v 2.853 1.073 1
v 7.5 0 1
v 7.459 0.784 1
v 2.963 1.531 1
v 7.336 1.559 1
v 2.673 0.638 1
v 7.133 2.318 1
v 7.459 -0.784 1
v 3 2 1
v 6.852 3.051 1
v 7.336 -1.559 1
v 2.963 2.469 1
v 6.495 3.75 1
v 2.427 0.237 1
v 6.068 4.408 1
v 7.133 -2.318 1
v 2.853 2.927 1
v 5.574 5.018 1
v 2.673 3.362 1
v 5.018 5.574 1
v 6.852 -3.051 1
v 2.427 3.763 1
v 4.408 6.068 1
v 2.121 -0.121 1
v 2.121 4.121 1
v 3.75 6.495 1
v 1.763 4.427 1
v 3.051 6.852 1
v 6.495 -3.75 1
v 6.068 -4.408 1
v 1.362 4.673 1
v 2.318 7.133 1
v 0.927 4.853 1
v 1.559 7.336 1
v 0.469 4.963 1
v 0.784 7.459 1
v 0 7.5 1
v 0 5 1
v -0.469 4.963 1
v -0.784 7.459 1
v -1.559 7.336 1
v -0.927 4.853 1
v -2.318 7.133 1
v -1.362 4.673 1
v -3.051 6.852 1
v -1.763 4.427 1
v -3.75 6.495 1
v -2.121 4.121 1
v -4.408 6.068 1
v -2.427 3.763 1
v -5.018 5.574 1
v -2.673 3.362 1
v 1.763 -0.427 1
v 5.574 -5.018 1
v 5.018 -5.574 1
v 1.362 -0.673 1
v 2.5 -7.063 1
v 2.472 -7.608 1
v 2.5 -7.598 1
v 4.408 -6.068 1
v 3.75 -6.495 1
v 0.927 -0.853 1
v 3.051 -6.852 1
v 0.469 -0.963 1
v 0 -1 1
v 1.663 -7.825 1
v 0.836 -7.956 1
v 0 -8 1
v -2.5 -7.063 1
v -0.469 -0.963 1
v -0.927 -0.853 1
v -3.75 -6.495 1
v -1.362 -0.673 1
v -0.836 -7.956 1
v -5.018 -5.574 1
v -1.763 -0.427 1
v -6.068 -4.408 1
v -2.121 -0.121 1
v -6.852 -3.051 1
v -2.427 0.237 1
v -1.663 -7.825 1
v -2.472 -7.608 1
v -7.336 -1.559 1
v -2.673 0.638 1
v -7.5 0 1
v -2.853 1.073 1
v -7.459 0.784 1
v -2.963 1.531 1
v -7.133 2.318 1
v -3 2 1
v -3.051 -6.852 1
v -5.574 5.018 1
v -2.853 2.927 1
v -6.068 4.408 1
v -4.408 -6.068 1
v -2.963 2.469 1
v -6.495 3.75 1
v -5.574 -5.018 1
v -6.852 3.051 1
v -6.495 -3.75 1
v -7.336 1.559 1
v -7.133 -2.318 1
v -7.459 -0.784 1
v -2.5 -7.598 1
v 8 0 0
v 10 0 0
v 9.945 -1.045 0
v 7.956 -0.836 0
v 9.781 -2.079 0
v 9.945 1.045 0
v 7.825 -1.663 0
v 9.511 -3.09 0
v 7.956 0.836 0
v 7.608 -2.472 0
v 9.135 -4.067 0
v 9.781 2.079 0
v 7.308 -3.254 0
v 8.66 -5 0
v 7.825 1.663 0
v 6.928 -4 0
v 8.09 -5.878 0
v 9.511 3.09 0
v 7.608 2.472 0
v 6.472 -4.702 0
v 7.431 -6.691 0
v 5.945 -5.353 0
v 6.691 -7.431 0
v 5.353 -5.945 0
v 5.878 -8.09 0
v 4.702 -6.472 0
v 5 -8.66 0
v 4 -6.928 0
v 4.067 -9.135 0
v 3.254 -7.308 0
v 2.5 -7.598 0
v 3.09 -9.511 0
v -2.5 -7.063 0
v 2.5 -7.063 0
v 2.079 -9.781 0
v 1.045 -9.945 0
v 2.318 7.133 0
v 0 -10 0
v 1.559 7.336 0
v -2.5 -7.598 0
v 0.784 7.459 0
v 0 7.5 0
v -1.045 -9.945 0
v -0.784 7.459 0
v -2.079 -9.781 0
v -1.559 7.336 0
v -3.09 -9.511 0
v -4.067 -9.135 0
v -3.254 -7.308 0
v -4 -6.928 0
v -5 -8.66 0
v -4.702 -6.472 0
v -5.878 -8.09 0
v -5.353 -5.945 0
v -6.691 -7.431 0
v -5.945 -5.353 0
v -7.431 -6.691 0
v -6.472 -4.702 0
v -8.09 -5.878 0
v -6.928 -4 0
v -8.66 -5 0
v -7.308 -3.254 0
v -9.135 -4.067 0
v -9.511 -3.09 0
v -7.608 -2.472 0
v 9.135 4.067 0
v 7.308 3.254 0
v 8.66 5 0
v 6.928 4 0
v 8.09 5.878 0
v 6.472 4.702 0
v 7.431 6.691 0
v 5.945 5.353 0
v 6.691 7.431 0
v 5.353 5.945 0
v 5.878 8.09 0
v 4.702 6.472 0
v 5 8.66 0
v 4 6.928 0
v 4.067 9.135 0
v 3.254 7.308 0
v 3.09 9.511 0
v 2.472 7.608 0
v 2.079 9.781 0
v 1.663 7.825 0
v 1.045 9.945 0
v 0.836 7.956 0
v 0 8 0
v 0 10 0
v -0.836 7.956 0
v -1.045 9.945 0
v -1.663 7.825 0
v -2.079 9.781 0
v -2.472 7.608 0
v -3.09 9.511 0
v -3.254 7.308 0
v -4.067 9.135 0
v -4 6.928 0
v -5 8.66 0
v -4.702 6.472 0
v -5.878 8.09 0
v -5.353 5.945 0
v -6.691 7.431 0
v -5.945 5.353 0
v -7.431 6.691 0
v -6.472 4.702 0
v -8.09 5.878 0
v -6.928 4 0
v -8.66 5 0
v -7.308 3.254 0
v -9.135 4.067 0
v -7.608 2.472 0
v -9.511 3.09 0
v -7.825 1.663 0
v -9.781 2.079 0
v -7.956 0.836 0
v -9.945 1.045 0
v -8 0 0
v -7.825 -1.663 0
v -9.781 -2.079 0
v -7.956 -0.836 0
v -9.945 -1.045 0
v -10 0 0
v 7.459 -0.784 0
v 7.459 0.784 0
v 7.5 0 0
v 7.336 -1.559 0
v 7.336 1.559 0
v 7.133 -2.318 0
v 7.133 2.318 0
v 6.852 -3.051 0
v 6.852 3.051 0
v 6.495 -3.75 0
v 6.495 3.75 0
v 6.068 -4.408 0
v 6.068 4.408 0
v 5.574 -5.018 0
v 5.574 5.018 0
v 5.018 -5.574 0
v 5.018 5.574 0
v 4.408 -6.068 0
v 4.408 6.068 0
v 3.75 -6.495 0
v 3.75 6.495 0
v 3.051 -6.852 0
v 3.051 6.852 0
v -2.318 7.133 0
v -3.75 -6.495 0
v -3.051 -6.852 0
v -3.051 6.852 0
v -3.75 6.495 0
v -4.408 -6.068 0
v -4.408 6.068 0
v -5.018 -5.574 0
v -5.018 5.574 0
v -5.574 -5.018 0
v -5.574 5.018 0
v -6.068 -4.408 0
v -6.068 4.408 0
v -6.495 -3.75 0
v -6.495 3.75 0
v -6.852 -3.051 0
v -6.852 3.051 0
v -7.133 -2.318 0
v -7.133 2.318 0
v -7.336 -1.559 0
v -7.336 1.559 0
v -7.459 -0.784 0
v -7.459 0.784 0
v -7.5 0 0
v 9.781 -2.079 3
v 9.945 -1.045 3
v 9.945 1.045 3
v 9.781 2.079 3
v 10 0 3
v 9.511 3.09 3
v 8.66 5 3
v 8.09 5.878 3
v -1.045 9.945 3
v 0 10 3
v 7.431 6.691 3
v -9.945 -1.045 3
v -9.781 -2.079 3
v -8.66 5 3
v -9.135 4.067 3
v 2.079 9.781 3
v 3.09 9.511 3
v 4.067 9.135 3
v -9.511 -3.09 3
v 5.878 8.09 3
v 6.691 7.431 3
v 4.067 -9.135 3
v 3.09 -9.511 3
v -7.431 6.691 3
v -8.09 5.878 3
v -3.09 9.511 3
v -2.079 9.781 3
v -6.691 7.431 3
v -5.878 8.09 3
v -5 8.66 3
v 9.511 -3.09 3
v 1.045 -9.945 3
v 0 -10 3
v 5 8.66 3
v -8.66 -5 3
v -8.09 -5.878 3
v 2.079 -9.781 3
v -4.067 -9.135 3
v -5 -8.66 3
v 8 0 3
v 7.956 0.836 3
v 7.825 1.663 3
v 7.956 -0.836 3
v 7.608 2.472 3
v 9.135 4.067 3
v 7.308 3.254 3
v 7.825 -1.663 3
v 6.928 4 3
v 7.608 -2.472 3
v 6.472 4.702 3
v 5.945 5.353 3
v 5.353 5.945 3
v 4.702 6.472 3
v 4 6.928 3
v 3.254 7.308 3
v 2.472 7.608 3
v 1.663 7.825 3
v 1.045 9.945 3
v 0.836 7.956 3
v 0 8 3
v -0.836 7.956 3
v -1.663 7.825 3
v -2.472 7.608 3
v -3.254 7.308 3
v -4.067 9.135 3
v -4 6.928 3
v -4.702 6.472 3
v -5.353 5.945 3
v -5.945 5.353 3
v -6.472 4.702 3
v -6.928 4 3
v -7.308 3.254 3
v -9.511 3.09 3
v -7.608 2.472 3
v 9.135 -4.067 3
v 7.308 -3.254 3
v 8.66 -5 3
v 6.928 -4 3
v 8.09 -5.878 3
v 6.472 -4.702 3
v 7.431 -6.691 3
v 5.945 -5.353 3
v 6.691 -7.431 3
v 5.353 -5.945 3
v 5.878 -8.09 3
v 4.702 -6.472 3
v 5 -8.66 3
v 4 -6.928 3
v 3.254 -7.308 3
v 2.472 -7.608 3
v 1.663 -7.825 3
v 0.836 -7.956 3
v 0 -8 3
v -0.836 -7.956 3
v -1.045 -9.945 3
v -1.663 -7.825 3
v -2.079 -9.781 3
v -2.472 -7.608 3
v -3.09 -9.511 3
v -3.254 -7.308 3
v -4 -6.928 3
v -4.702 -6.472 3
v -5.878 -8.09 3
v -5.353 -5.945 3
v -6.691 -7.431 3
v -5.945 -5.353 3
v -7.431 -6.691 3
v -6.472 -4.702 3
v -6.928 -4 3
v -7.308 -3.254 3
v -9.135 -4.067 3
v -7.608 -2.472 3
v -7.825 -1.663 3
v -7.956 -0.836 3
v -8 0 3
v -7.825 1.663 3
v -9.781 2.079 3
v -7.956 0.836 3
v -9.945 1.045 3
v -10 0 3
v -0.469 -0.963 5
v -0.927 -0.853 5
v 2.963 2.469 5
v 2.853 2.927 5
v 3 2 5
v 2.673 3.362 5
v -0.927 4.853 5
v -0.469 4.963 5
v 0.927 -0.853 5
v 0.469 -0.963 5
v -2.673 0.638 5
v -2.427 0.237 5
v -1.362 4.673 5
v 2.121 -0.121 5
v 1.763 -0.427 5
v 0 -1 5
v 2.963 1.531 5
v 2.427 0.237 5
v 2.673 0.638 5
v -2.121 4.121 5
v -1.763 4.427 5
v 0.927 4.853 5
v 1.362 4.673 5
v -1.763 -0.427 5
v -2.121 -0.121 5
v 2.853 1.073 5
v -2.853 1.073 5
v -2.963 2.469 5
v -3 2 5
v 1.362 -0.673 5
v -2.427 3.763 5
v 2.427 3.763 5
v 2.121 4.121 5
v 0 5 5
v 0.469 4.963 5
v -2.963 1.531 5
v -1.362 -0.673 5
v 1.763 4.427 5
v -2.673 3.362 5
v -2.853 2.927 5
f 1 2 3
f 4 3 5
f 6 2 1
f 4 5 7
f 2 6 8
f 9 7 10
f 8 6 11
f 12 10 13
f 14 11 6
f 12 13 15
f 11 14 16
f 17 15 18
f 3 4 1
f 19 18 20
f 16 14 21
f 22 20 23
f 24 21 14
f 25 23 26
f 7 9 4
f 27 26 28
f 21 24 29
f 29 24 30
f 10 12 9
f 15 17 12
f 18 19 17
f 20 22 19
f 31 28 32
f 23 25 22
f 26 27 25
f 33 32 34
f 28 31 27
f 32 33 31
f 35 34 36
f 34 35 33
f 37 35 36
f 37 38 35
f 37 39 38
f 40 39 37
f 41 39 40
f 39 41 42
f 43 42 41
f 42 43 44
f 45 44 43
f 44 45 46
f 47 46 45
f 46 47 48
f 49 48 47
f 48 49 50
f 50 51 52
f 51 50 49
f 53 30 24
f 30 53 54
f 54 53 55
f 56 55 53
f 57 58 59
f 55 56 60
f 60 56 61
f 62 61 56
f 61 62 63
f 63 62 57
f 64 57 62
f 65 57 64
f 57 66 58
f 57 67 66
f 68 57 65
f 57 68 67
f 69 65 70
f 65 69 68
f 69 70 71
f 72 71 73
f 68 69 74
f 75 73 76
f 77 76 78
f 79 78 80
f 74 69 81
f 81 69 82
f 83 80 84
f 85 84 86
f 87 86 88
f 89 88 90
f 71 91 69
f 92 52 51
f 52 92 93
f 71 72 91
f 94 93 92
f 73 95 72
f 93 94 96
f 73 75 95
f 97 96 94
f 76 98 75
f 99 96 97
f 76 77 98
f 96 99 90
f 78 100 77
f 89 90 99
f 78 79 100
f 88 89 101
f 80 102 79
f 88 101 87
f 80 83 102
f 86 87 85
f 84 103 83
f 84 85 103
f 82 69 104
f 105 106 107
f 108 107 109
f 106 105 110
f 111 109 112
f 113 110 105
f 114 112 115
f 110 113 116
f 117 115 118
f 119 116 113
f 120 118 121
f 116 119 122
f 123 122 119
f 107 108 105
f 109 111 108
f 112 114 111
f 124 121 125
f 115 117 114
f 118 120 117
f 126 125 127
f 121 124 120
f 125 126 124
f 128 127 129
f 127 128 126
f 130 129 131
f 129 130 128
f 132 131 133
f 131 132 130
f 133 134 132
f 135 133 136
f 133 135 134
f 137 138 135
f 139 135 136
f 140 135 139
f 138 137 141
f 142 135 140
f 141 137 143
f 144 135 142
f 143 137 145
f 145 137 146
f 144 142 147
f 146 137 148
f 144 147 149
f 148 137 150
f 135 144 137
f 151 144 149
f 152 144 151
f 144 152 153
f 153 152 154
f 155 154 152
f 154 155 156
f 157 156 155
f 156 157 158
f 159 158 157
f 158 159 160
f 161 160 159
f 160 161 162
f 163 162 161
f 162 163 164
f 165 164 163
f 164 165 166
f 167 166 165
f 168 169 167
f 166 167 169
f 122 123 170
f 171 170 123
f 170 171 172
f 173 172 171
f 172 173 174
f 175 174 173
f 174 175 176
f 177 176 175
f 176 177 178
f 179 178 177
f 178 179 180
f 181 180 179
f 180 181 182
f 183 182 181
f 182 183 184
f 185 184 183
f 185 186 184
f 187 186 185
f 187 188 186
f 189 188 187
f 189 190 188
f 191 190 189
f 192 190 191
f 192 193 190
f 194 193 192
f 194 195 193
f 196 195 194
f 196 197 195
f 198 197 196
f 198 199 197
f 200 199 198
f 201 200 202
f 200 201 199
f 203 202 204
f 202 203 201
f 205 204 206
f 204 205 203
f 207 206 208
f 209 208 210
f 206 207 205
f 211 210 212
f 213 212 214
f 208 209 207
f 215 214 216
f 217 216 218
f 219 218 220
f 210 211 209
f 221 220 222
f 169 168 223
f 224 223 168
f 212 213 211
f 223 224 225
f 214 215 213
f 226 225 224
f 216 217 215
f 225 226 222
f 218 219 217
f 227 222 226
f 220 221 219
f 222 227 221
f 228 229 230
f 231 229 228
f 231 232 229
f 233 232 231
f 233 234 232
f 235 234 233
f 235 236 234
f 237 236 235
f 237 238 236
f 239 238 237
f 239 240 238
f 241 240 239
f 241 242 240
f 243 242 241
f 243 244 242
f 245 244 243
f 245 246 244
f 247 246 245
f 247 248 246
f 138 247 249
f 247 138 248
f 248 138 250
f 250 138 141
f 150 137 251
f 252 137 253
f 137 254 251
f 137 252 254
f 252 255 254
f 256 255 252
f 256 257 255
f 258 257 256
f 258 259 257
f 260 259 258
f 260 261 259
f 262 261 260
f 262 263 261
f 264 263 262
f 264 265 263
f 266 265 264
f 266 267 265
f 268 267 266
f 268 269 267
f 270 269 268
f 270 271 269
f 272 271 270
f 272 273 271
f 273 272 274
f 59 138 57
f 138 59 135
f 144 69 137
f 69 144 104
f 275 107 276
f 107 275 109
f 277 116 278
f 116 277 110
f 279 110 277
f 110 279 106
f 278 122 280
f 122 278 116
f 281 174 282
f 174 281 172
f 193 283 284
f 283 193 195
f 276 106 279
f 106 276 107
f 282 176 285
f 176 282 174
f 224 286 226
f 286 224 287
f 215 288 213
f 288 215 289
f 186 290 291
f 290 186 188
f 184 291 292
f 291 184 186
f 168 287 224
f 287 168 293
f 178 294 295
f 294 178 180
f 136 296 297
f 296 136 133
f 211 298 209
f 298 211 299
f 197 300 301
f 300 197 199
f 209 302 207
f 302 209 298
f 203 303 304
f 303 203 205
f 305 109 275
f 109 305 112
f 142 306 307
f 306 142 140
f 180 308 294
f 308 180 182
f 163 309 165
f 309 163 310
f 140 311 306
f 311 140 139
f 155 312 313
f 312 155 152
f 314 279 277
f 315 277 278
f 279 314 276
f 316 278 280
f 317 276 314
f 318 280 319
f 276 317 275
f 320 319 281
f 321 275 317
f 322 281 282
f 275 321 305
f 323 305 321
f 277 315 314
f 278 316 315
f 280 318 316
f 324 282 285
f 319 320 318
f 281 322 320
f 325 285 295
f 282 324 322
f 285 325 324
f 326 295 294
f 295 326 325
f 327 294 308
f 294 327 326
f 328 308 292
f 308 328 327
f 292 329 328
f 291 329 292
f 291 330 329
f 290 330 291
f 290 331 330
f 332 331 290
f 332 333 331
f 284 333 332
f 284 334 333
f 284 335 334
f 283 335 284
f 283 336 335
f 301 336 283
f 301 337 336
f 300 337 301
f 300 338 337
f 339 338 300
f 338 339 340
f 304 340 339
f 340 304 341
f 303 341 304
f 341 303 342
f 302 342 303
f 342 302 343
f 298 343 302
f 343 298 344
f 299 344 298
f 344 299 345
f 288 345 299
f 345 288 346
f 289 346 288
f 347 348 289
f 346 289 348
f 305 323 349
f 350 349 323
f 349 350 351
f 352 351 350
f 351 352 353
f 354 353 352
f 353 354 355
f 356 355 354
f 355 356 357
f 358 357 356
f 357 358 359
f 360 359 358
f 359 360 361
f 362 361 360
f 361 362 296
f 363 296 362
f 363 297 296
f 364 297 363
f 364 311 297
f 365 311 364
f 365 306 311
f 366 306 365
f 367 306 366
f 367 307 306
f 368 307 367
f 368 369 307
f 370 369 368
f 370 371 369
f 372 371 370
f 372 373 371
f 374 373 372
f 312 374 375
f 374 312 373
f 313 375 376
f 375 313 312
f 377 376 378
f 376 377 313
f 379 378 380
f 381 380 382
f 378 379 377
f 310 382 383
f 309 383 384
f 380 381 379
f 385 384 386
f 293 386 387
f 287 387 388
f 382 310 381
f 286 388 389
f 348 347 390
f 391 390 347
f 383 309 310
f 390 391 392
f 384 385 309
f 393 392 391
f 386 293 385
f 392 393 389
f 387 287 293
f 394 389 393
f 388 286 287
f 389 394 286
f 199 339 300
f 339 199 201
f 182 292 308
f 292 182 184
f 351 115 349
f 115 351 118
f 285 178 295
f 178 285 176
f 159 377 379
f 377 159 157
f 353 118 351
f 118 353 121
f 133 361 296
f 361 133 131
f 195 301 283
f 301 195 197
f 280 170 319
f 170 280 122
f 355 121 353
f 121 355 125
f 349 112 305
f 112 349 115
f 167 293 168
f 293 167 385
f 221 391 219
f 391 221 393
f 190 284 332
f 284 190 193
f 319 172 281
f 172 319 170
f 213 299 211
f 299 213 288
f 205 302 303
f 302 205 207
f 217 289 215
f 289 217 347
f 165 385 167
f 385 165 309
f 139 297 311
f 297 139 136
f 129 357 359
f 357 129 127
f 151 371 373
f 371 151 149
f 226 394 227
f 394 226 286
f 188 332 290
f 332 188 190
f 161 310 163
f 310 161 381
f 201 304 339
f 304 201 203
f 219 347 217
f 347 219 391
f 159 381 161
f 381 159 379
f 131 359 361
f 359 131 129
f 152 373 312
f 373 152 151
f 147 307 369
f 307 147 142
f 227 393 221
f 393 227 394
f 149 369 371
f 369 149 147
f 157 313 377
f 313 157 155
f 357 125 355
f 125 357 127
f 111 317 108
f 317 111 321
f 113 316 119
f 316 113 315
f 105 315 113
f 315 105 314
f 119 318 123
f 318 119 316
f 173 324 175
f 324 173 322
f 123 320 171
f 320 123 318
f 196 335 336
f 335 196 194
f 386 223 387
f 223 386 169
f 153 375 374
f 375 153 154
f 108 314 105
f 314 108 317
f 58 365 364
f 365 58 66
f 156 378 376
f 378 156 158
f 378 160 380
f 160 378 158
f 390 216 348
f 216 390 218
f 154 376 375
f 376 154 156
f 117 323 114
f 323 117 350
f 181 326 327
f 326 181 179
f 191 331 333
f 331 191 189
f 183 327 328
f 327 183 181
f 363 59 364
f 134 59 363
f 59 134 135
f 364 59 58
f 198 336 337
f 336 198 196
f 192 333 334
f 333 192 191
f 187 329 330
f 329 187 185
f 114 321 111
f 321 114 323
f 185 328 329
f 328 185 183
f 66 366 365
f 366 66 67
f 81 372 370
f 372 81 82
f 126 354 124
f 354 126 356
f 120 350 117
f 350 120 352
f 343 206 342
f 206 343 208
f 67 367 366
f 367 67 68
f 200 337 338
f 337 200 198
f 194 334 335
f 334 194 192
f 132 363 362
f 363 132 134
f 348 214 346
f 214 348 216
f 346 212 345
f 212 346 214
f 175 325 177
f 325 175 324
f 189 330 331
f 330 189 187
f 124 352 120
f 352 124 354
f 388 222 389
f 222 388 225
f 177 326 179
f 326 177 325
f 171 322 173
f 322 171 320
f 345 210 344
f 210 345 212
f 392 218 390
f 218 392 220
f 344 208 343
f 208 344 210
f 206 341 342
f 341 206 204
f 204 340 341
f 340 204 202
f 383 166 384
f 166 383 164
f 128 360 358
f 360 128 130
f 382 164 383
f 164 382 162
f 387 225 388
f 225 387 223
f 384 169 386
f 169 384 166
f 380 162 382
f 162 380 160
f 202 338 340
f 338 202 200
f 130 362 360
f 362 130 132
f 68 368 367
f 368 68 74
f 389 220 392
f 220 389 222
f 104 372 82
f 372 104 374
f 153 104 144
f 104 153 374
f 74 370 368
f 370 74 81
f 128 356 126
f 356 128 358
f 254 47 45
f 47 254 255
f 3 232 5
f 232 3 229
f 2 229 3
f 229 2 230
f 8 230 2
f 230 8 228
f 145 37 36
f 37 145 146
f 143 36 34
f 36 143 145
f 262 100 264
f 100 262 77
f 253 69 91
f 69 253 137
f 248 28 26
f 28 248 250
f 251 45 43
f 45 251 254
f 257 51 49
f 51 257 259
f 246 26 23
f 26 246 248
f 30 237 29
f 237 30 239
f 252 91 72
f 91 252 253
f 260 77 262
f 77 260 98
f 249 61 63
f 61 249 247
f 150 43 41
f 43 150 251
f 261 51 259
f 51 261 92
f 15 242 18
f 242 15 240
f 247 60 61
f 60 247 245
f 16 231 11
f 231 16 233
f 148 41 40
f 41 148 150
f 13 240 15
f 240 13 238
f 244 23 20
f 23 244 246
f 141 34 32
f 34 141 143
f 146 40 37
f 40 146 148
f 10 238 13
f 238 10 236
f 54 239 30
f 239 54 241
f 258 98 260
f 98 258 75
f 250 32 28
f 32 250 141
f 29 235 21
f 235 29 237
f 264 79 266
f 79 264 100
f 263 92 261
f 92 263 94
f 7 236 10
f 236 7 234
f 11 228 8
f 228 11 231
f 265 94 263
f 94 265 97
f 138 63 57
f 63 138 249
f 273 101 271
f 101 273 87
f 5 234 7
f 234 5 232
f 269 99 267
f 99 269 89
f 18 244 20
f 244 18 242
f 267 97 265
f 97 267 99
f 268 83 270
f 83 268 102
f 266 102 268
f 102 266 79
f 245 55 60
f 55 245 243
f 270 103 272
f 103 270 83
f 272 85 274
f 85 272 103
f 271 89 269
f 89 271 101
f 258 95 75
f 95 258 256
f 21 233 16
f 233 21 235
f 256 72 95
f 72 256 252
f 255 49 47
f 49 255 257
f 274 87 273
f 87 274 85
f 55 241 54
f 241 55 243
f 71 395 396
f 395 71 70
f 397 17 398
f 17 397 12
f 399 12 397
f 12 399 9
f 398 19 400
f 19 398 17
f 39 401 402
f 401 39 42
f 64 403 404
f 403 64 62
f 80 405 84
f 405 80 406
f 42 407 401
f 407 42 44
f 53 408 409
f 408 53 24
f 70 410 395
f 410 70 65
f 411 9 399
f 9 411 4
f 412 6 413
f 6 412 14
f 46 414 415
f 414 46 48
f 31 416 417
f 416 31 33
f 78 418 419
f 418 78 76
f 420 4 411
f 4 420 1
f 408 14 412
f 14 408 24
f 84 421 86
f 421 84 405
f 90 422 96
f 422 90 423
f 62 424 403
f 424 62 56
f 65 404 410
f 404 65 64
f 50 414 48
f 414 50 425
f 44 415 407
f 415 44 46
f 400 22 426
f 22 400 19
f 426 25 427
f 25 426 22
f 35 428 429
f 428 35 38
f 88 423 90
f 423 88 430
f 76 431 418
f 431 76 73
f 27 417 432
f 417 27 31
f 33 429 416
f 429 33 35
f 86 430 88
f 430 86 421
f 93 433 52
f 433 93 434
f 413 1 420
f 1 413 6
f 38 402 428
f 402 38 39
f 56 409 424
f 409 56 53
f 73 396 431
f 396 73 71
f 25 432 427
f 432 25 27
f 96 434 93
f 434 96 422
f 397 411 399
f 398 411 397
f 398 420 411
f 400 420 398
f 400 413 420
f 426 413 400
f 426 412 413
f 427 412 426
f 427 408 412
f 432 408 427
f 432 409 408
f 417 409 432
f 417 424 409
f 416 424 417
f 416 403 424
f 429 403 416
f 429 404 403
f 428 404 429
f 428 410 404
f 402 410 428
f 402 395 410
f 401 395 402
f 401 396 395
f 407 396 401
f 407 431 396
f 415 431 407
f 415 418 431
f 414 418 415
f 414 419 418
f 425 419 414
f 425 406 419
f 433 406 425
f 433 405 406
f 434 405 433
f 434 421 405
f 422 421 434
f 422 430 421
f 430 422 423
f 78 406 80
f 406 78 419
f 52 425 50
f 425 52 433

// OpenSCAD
LED_d = 5;

Bat_r = 10;
Bat_d = 8;

edge_r = 1;

// base
%difference() {
	difference() {	
		linear_extrude(height=Bat_d+2*edge_r) {
			hull() {
				translate([Bat_r+5, 0]) square([LED_d+edge_r*1.5, 6], center=true);	
				circle(r=Bat_r+edge_r);
			}
		}
		translate([0, 0, edge_r]) cylinder(r=Bat_r, h=Bat_d+edge_r);
	}
	translate([Bat_r+4, 0, Bat_d/2+edge_r]) rotate([0, 90, 0]) cylinder(r=LED_d/2, h=5, $fn=30);
	translate([Bat_r-1, 0, Bat_d/2+edge_r]) rotate([0, 90, 0]) cylinder(r=LED_d/2+0.5, h=5, $fn=30);
}

// loop
%difference() {
	translate([-Bat_r-edge_r-1, 0, 1]) rotate_extrude($fn=20) translate([3.5, 0, 0]) circle(r=1, $fn=20);
	cylinder(r=Bat_r+edge_r, 2);
}

// lid
union() {
	difference() {
		cylinder(r=Bat_r-edge_r, h=1, $fn=60);
		translate([Bat_r/2+2.5,0,0]) cube([Bat_r, 2*Bat_r, 2], center=true);
  		translate([-(Bat_r/2+2.5),0,0]) cube([Bat_r, 2*Bat_r, 2], center=true);
		translate([0, Bat_r/2, 0]) cube([Bat_r, Bat_r, Bat_r], center=true);
	}
	cylinder(r=Bat_r-edge_r*2.5, h=1, $fn=60);
	translate([0, 2, 1]) cylinder(r=3, h=4, $fn=40);

	difference() {
		cylinder(r=Bat_r, h=3, $fn=60);
		cylinder(r=Bat_r-edge_r*2, h=4, $fn=60);
	}
}
